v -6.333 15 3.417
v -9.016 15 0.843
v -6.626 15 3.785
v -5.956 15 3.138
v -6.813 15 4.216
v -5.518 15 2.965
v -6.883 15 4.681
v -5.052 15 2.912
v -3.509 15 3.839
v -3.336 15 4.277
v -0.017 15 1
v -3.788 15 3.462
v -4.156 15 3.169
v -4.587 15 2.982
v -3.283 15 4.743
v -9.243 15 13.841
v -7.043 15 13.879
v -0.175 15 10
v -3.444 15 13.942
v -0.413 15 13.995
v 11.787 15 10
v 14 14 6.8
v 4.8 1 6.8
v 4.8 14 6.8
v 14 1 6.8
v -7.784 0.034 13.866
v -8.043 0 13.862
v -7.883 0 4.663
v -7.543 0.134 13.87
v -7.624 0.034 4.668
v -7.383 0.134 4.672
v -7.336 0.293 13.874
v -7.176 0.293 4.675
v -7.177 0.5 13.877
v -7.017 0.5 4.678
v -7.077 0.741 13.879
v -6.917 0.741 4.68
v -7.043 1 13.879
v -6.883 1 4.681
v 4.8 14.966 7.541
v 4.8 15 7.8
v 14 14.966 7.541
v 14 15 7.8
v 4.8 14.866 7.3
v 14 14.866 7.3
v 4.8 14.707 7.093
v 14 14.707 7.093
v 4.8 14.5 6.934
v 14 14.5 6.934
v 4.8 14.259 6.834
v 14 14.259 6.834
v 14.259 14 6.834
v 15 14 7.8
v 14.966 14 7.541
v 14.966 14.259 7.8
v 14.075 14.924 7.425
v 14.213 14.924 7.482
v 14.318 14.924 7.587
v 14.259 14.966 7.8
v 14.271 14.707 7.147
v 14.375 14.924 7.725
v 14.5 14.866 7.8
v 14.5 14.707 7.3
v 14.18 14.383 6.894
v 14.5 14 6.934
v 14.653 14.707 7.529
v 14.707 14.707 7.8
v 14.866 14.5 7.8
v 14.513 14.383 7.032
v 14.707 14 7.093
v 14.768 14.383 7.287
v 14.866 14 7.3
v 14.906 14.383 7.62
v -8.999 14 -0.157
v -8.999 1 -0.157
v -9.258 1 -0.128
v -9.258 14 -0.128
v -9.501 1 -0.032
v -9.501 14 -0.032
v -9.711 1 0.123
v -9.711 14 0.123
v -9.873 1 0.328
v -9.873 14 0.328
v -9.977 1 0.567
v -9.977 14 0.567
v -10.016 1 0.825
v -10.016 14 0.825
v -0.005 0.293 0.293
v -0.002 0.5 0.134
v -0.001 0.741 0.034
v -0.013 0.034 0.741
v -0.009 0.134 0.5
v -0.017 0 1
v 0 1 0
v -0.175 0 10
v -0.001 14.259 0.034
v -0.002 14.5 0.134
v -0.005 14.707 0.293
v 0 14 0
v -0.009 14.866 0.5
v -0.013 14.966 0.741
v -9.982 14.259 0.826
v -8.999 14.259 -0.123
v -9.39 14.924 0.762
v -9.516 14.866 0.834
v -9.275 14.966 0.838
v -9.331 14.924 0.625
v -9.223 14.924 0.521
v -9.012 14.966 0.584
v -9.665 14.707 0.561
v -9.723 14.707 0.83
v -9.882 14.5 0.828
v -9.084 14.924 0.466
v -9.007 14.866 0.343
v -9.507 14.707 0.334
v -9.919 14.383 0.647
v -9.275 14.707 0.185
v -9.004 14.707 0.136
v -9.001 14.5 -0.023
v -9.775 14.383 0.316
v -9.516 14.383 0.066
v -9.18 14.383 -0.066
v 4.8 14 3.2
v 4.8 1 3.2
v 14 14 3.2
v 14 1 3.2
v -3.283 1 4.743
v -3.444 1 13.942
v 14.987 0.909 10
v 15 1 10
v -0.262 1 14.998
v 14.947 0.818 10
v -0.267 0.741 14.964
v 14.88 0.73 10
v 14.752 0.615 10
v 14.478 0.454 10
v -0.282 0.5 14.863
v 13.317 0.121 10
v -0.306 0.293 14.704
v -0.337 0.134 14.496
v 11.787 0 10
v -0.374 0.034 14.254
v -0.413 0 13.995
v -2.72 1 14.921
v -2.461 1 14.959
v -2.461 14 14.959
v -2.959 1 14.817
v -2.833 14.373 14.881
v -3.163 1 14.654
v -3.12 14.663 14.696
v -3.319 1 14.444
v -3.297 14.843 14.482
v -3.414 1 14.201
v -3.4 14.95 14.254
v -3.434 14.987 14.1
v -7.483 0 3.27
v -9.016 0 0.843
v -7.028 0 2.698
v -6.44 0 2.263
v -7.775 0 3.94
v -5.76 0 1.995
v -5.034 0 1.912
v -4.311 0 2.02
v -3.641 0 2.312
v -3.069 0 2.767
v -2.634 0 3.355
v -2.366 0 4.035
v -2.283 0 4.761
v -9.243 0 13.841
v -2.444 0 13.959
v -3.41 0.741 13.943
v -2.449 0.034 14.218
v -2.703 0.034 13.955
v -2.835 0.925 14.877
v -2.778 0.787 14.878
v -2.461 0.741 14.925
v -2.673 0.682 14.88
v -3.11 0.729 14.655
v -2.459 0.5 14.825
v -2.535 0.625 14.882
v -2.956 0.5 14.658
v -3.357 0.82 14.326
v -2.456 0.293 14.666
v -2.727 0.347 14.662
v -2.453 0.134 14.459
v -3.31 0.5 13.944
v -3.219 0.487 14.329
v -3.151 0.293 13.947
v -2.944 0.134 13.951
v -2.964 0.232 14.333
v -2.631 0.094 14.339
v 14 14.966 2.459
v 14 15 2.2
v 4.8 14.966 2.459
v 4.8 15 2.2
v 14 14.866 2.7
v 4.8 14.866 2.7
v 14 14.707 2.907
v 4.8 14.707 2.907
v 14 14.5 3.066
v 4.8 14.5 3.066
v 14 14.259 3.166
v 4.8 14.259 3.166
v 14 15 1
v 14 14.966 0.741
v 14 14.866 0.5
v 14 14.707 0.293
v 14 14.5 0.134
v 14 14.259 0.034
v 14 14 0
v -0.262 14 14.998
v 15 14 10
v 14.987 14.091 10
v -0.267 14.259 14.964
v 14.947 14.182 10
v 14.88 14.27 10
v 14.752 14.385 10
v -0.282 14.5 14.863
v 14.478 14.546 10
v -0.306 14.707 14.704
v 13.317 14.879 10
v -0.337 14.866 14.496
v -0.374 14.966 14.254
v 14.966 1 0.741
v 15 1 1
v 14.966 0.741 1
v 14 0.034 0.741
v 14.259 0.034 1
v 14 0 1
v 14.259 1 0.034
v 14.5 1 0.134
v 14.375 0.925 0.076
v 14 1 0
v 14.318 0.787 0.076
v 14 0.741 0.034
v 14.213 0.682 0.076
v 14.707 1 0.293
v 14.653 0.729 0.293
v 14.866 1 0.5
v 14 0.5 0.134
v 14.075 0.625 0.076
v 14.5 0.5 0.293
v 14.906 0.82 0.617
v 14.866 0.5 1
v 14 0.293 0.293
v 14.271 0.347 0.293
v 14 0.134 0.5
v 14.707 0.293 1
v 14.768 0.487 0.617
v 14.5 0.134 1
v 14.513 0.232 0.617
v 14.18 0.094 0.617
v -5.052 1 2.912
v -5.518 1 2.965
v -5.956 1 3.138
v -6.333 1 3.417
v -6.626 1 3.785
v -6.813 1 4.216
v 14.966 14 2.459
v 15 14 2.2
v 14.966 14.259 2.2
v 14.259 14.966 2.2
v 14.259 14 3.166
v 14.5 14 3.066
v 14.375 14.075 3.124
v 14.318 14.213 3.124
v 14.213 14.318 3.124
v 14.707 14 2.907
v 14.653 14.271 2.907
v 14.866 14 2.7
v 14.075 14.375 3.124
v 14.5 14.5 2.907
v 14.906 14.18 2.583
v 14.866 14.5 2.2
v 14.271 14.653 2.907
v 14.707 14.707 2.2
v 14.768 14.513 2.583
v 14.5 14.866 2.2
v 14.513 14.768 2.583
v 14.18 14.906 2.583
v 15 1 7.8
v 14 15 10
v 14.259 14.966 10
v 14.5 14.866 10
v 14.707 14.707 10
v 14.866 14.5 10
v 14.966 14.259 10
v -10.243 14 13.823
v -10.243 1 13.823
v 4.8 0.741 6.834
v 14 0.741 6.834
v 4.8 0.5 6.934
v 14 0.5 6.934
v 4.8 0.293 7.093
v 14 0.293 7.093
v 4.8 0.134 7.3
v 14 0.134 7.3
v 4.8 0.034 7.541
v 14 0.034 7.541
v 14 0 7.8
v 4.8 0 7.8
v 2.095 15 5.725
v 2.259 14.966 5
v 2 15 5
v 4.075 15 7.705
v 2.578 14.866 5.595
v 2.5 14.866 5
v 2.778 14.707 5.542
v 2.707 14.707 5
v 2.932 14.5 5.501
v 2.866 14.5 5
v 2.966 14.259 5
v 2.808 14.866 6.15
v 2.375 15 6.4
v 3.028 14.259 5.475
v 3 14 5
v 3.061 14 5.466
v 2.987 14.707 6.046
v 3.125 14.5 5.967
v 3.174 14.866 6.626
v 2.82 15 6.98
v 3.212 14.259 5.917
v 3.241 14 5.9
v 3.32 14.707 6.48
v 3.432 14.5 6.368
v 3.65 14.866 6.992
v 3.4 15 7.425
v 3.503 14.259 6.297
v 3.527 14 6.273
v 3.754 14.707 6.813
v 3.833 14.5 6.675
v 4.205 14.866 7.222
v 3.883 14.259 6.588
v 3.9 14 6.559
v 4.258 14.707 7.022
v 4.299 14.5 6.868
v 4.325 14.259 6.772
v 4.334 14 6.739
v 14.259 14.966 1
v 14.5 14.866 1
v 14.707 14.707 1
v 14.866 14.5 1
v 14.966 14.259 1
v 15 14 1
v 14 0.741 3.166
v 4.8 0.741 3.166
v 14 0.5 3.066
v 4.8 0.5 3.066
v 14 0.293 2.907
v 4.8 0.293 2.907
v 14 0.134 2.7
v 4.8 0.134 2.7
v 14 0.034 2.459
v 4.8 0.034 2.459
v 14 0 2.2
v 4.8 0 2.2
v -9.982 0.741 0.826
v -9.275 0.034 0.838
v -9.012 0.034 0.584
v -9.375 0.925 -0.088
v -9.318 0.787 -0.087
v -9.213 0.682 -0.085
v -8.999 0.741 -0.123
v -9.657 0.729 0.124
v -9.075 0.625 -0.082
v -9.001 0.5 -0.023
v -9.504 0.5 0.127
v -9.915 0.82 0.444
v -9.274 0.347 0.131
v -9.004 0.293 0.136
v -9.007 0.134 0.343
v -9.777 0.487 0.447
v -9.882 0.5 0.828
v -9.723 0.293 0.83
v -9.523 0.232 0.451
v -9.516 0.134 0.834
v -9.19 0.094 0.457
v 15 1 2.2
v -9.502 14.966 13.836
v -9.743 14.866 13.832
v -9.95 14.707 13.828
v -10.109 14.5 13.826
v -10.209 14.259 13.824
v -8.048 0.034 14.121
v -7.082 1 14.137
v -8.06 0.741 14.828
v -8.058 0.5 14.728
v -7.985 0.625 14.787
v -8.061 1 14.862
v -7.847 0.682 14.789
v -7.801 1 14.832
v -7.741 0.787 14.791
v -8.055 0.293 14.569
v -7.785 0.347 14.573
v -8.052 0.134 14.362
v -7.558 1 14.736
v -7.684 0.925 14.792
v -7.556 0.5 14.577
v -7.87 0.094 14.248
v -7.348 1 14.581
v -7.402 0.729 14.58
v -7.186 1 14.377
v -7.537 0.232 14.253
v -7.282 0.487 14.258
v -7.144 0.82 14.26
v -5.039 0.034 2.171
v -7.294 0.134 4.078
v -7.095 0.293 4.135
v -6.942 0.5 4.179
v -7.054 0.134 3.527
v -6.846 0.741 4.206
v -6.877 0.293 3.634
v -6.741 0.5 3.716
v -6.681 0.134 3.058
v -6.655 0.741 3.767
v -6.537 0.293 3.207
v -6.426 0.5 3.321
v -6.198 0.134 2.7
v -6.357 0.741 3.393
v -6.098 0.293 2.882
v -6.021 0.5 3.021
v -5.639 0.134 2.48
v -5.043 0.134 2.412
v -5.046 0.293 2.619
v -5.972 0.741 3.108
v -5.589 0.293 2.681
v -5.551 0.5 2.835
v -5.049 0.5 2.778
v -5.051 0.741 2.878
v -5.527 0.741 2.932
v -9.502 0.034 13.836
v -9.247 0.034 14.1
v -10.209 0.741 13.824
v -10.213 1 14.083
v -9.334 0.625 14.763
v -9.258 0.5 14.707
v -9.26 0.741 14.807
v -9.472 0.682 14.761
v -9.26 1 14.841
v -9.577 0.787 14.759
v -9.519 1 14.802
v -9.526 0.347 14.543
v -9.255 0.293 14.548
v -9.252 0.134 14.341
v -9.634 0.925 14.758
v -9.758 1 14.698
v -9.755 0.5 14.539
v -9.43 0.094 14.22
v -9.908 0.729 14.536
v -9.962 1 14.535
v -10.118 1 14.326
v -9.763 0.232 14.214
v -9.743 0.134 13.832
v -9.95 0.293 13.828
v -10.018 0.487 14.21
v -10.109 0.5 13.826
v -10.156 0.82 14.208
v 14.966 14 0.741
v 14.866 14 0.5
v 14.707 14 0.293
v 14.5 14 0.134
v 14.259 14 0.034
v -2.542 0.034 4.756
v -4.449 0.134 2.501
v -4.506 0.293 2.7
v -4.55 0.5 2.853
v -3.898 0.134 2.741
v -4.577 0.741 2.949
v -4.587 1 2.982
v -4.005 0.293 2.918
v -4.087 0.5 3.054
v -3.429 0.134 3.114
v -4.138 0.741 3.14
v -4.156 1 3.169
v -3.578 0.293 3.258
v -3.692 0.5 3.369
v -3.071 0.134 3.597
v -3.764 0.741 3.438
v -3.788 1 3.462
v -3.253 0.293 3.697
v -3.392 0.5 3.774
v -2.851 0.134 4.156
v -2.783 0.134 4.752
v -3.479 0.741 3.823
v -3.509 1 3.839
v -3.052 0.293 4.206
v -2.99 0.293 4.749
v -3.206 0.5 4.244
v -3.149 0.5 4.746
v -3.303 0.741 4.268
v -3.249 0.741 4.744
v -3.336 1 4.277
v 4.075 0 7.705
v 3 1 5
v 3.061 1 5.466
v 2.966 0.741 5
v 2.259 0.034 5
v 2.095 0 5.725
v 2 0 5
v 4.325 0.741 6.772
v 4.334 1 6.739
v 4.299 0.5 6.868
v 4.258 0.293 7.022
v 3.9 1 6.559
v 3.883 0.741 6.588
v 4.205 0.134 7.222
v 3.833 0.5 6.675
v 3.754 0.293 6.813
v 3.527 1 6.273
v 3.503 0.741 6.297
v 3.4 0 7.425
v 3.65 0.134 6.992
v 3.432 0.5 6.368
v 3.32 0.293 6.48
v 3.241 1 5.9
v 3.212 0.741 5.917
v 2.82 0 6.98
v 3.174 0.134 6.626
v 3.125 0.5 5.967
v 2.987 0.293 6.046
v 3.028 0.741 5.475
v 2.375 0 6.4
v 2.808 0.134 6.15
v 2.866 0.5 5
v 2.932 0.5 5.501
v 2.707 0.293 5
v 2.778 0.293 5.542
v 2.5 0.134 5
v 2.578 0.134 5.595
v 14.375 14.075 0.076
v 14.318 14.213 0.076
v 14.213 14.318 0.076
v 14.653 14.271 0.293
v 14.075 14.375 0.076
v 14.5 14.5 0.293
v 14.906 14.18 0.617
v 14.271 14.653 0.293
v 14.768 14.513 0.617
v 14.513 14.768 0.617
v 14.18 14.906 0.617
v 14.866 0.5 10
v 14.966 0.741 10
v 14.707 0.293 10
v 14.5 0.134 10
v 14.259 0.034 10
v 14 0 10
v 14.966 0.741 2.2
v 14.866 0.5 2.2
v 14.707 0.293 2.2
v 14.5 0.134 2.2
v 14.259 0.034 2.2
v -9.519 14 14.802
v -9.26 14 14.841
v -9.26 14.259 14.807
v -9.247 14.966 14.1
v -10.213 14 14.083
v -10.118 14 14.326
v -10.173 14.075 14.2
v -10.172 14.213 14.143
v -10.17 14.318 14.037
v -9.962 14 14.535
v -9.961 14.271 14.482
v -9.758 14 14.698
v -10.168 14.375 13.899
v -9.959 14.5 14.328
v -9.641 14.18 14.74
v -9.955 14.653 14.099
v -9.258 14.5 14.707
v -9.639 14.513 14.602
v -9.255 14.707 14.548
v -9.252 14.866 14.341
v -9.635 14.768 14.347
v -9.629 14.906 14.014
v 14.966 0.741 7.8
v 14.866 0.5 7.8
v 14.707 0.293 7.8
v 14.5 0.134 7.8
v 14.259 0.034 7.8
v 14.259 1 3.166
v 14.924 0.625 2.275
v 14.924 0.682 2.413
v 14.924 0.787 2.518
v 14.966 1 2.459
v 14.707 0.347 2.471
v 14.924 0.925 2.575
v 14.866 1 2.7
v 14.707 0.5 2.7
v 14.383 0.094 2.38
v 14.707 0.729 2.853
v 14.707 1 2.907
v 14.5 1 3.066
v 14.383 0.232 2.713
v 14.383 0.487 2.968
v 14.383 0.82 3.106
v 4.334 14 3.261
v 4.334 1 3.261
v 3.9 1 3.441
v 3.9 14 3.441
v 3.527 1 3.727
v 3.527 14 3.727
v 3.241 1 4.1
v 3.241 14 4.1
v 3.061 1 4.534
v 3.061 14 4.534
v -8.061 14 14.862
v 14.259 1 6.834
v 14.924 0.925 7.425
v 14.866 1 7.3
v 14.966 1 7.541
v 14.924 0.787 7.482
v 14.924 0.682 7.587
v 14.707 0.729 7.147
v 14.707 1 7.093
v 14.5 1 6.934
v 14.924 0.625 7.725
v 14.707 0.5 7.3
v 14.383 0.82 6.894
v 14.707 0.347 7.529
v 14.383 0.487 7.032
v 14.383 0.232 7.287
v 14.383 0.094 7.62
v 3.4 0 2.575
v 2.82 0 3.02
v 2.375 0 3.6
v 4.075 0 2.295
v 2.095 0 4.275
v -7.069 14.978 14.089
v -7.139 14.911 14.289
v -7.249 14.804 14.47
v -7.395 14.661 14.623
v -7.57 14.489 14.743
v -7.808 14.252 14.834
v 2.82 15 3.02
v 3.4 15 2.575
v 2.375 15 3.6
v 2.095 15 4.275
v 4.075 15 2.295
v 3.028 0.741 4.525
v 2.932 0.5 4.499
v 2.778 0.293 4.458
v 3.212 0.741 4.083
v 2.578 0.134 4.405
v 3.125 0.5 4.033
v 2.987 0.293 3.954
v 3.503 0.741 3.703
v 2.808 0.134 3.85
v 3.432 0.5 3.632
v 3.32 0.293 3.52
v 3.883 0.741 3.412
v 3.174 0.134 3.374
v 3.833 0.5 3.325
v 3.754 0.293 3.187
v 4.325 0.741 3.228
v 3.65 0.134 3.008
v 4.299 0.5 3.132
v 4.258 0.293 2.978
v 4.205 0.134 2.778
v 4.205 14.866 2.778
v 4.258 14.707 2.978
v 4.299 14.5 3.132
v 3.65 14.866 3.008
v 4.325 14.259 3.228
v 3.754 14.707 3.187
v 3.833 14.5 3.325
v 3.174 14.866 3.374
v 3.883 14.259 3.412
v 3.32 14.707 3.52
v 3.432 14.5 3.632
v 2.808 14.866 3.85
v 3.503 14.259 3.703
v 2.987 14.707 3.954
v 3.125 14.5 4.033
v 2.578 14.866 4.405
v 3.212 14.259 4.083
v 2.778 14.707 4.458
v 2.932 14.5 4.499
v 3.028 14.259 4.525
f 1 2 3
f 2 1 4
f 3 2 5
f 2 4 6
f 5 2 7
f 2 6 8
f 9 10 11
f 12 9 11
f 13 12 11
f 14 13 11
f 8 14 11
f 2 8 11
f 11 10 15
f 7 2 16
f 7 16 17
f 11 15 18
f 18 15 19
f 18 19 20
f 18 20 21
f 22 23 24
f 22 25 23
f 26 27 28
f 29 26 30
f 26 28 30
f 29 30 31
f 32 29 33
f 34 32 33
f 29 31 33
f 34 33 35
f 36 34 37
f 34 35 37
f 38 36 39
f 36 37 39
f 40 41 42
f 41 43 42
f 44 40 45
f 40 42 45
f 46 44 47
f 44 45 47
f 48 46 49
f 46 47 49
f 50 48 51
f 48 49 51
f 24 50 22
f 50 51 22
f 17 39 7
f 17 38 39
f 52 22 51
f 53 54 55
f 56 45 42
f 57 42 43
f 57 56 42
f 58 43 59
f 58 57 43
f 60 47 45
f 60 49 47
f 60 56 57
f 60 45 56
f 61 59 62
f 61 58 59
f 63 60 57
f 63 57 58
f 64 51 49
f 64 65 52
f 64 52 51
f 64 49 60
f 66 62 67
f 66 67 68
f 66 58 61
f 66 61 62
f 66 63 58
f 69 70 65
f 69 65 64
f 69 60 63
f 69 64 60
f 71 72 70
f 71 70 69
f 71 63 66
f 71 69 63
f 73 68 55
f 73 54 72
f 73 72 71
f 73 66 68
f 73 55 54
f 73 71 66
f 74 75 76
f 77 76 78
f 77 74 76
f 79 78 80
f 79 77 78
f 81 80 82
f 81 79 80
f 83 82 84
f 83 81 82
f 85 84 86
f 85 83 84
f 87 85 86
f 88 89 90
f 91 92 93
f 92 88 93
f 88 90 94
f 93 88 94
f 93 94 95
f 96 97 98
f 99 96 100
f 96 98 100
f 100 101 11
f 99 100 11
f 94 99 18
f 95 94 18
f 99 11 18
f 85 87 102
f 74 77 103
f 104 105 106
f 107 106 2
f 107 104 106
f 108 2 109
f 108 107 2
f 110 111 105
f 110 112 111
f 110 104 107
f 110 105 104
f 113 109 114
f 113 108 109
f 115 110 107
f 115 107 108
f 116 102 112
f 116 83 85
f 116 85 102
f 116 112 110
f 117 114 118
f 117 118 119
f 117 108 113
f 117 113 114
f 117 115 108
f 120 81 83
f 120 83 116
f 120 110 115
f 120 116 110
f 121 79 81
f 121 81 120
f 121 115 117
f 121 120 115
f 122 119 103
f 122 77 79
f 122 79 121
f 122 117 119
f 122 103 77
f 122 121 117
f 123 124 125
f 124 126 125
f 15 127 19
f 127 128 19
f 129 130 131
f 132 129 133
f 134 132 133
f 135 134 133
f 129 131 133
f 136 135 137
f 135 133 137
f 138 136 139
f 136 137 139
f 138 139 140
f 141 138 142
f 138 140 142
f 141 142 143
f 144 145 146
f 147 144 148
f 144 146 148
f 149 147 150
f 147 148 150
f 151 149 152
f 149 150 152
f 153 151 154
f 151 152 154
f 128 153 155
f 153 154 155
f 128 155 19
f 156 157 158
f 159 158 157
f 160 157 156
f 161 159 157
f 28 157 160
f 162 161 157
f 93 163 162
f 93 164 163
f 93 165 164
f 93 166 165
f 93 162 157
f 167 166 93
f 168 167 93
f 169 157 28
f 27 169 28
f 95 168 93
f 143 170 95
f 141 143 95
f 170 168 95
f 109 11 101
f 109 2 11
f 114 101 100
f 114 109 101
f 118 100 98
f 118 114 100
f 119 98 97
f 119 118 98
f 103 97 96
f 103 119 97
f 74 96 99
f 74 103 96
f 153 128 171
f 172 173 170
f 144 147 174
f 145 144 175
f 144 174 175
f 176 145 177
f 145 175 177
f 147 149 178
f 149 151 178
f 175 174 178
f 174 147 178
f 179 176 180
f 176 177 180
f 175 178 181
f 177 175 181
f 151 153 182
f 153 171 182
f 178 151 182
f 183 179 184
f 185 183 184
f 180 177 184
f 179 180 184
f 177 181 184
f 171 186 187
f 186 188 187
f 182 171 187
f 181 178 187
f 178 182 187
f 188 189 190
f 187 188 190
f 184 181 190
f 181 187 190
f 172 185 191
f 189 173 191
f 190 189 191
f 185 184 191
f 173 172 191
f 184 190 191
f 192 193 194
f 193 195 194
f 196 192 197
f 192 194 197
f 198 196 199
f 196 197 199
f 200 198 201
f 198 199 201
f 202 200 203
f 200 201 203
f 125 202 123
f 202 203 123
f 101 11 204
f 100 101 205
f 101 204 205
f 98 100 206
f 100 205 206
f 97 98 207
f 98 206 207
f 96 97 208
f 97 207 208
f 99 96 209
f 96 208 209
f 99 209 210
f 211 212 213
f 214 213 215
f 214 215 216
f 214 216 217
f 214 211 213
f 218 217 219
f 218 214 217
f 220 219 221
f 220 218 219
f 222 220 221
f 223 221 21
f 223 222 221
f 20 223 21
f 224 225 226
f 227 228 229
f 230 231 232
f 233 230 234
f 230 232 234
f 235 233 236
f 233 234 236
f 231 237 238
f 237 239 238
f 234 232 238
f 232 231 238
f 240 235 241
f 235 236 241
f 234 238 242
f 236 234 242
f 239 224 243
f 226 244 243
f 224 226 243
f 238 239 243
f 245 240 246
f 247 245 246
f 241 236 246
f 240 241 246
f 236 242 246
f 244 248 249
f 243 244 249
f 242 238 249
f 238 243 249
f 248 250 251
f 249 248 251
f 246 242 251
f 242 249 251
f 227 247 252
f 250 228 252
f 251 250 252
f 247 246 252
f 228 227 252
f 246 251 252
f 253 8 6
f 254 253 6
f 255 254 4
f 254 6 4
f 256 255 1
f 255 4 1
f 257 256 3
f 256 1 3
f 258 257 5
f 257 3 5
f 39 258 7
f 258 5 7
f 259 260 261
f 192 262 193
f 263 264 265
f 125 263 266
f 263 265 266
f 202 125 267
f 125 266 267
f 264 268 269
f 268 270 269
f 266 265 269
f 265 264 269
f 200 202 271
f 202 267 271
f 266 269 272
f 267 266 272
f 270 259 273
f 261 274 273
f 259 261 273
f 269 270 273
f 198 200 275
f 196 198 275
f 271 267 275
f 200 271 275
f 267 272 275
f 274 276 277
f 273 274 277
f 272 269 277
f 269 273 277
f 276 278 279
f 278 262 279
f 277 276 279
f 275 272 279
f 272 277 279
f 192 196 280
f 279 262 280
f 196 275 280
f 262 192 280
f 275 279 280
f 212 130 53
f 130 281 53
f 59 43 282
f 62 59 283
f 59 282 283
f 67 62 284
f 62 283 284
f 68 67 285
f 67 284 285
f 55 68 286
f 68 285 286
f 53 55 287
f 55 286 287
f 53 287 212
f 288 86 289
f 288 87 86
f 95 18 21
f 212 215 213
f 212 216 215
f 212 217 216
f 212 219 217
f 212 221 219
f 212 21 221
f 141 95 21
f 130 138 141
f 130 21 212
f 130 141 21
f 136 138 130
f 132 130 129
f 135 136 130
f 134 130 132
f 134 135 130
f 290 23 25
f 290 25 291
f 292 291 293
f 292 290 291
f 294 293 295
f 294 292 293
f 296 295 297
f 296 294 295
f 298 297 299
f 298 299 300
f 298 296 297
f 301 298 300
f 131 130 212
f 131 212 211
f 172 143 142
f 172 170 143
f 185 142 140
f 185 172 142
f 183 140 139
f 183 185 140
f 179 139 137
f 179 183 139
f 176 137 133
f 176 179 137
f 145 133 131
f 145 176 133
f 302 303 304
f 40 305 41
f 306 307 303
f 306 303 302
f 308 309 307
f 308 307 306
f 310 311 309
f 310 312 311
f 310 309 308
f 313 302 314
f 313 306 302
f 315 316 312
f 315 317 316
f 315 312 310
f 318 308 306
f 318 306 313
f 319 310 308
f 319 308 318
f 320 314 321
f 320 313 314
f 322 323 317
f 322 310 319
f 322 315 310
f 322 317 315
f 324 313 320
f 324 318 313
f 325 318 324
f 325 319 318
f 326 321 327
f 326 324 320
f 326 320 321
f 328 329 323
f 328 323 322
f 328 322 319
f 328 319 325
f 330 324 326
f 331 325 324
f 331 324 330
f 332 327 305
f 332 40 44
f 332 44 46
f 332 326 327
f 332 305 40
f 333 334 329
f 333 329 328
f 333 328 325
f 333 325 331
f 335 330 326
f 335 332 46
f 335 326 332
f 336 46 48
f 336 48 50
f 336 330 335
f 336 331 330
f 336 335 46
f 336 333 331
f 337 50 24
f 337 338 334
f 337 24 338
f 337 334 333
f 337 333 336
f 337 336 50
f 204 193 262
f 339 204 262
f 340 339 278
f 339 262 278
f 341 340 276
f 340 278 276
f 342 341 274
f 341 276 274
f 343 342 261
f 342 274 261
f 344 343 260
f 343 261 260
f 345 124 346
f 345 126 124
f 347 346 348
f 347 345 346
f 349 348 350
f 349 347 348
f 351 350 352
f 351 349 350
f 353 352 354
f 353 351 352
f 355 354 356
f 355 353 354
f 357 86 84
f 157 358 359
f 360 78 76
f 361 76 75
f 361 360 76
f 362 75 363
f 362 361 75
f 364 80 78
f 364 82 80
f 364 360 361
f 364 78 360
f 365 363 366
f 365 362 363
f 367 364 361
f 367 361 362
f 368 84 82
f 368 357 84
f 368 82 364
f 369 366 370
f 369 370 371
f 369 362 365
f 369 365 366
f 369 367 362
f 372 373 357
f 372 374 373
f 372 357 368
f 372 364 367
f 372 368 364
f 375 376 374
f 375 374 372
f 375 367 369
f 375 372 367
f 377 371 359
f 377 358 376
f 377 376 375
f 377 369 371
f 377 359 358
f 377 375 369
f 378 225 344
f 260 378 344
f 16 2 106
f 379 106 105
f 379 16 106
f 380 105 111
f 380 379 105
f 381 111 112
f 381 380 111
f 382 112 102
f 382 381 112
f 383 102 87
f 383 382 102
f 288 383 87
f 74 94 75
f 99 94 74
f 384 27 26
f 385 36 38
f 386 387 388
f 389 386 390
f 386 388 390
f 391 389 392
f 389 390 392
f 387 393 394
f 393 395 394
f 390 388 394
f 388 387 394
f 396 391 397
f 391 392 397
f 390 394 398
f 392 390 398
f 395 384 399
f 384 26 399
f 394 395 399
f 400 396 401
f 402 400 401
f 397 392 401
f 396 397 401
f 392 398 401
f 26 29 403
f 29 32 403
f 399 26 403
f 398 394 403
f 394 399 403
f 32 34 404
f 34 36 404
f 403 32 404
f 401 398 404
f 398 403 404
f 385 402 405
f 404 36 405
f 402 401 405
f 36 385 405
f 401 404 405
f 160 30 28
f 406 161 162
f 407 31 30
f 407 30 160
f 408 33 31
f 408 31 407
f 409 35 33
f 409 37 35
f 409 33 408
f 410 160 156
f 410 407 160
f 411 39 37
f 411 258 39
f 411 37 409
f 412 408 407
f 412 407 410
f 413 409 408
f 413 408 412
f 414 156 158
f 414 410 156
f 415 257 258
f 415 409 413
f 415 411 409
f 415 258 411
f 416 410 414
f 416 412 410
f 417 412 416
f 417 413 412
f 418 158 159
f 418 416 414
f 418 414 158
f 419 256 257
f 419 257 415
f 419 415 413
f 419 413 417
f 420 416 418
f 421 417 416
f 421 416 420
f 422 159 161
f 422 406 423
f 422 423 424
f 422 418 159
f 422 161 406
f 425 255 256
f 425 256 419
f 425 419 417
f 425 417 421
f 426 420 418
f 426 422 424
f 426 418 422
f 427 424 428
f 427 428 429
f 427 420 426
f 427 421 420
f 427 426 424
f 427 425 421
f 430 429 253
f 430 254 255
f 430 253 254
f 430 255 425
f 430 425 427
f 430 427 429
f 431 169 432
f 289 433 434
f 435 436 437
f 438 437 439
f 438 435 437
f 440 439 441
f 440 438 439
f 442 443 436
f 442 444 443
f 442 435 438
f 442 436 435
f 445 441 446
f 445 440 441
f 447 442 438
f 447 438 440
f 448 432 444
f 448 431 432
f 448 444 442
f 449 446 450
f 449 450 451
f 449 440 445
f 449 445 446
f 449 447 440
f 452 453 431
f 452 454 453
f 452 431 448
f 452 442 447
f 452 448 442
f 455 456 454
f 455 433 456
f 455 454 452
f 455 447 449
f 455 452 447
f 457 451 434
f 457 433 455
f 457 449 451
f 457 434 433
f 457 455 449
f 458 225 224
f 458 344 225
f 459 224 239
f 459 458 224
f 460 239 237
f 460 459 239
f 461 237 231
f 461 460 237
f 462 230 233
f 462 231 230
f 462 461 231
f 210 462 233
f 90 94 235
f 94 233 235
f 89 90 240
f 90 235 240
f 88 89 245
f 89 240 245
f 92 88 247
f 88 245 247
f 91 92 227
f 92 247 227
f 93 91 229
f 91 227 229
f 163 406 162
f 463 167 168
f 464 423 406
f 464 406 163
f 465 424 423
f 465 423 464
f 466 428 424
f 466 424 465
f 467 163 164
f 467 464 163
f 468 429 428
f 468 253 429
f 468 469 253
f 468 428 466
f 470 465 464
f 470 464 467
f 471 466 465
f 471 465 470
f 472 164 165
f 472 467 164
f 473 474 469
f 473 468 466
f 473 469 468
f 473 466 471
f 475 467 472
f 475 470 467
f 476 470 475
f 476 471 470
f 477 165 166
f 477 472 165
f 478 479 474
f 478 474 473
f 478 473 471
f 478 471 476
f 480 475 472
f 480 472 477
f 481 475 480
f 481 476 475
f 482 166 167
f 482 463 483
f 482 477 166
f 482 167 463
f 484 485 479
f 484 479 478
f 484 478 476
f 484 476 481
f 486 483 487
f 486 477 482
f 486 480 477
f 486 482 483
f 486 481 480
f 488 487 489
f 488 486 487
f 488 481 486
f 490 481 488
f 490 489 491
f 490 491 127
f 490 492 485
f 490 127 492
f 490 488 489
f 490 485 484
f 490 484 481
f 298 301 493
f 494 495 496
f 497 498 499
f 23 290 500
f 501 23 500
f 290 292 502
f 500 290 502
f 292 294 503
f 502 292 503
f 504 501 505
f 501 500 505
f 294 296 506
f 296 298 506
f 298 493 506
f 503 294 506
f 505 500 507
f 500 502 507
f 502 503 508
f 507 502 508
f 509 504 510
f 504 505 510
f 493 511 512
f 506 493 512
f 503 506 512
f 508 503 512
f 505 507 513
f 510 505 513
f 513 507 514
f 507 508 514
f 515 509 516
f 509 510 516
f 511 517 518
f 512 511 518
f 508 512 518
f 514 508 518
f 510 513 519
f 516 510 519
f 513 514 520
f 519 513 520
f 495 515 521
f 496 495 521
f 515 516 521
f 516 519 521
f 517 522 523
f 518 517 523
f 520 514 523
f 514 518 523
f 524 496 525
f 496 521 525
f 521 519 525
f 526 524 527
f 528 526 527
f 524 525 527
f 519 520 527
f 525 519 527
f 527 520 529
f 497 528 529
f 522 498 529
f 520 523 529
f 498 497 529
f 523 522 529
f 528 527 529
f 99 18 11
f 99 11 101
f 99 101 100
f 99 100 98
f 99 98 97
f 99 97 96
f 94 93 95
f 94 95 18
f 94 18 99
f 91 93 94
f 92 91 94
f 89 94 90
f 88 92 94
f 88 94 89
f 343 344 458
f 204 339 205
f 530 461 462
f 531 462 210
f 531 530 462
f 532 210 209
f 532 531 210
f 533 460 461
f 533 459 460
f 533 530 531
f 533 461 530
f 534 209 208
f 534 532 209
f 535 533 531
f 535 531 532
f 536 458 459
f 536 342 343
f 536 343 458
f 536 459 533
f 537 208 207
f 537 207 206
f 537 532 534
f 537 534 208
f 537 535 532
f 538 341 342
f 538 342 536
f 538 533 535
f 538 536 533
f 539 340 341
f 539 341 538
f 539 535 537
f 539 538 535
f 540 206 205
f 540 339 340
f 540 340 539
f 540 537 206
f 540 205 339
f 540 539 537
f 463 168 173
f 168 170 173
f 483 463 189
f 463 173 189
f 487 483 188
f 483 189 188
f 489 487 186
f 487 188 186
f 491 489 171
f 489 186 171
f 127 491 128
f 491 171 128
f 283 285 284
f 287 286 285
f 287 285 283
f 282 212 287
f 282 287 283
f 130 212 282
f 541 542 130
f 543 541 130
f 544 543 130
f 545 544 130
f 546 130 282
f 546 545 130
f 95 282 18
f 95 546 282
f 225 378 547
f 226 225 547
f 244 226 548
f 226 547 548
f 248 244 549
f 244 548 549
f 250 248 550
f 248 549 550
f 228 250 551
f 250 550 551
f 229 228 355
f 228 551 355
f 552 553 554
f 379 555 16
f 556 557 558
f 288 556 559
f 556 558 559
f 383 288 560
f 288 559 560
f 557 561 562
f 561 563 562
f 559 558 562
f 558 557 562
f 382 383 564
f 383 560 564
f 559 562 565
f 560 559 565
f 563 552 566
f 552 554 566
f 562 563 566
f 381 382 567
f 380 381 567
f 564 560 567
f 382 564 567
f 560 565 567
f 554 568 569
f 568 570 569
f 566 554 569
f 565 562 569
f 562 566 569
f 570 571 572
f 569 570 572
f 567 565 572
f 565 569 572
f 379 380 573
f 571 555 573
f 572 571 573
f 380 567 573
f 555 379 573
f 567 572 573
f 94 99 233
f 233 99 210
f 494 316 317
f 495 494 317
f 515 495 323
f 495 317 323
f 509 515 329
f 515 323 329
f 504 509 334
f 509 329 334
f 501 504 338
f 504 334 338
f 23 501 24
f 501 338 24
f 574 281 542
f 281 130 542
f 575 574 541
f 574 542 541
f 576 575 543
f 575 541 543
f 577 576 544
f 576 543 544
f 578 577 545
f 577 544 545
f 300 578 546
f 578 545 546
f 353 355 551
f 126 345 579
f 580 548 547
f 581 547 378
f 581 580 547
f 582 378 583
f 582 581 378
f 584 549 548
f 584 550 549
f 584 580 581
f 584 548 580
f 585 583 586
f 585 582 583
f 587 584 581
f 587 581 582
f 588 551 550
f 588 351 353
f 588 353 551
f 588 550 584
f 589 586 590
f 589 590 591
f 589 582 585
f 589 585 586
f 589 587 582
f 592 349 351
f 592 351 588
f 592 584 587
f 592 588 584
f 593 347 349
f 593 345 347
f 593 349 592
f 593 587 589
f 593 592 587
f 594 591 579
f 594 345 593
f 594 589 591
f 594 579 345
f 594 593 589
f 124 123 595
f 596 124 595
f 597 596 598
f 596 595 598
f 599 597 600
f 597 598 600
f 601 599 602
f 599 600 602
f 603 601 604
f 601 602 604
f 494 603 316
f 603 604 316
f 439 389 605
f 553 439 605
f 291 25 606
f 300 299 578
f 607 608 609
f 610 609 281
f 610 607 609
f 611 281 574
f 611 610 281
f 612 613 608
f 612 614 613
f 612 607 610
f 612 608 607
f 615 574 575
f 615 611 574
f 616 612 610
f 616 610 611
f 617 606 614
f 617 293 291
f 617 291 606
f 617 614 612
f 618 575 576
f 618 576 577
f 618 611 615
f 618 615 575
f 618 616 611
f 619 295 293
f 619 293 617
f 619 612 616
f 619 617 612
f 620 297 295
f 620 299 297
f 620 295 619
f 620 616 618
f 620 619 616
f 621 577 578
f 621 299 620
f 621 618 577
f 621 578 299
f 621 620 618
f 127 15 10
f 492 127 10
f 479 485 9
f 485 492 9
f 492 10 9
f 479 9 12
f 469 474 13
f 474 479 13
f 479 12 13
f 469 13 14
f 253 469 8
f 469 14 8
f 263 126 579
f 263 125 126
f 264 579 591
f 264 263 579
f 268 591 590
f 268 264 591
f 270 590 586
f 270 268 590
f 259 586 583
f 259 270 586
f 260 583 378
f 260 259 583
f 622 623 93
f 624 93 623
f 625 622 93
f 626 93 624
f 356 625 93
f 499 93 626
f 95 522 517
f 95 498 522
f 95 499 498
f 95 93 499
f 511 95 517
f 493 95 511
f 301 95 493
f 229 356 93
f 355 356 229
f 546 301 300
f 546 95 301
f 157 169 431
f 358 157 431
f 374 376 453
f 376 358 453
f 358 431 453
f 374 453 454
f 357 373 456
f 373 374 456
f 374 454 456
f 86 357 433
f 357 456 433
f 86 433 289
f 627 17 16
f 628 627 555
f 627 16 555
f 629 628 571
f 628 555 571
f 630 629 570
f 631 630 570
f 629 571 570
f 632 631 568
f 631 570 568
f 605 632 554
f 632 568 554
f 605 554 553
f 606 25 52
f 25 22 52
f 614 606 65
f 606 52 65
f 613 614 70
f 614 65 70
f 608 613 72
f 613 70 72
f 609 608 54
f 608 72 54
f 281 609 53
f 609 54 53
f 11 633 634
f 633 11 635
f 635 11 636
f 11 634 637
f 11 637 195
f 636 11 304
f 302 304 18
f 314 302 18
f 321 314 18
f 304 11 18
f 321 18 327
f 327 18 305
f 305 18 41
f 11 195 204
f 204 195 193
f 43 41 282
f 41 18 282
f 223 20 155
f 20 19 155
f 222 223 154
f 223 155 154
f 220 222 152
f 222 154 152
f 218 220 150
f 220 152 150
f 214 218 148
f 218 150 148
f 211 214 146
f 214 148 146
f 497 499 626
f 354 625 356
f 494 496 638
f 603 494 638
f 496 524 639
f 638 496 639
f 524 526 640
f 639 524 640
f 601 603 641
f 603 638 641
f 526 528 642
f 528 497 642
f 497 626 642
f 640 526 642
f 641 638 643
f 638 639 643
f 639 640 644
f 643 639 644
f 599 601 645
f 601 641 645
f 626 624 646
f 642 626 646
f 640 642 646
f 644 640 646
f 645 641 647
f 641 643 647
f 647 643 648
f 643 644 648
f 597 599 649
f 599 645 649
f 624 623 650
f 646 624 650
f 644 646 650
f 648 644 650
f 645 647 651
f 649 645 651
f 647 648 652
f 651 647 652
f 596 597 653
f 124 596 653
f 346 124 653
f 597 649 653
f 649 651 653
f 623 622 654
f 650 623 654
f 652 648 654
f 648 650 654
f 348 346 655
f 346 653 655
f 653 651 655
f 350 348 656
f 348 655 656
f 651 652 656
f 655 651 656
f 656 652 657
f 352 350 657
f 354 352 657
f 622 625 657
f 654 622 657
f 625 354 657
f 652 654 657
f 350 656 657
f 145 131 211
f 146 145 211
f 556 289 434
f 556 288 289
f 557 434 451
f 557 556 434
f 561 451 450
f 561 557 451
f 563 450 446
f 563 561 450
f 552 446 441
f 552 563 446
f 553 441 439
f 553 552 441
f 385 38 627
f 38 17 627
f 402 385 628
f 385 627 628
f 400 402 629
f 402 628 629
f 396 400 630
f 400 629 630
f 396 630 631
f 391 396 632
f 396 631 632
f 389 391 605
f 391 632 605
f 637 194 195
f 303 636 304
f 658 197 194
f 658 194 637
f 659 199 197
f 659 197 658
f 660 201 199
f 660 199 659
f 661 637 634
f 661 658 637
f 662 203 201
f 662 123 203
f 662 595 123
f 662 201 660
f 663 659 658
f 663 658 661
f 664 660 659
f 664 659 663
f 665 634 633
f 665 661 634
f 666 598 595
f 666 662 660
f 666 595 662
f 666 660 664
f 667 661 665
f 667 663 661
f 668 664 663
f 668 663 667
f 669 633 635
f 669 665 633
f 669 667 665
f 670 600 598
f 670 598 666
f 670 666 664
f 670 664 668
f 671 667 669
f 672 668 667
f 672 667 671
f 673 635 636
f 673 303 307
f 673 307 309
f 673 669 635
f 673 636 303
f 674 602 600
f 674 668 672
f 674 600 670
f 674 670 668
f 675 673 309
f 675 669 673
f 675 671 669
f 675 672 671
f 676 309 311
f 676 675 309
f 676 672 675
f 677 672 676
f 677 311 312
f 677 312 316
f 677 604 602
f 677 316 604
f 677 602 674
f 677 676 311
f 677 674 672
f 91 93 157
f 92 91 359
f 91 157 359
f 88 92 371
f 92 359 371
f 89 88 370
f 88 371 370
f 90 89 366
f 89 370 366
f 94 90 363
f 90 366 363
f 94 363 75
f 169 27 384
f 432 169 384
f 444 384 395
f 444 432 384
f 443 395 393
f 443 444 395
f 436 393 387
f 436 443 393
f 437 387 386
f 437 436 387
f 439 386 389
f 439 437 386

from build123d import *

# Parameters (mm, degrees)
F0_W     = 15
F0_H     = 15
F1_DEPTH = 10
F2_W     = 15
F2_H     = 3.6
F3_DEPTH = 12
F4_R     = 1.79999
F5_COUNT = 2
F5_ANGLE = 91
F7_DEPTH = 15
F9_DEPTH = 15
F10_R    = 1
F10_2_R  = 1


# Not quite as in the source:
# - a fillet or chamfer is up to 0.001 mm smaller than in the source, because OpenCascade refuses the exact size


with BuildPart() as f1:
    # F0 (on Top) → F1 (new body)
    with BuildSketch(Plane.XY):
        with Locations((7.5, 7.5)):
            Rectangle(F0_W, F0_H)
    extrude(amount=F1_DEPTH)

    # F2 (on face) → F3 (cut)
    with BuildSketch(Plane.YZ.offset(15)):
        with Locations((7.5, 5)):
            Rectangle(F2_W, F2_H)
    extrude(amount=-F3_DEPTH, mode=Mode.SUBTRACT)

    # F4 (radius 1.8 in the source; OpenCascade refuses exactly that, so slightly less here)
    f4_edges = [f1.edges().sort_by_distance(p)[0] for p in [
        (3, 7.5, 3.2),
        (3, 7.5, 6.8),
    ]]
    fillet(f4_edges, radius=F4_R)


with BuildPart() as f5_1:
    # F5: instance of F1
    add(f1.part.rotate(Axis((0, 7.5, 0), (0, -1, 0)), 1 * F5_ANGLE / (F5_COUNT - 1)))

    # F8 (on Front) → F9 (join, through all)
    with BuildSketch(Plane.XZ):
        Polygon((-0.2617860966, 14.9977154273), (-0.1745506493, 10), (15, 10), align=None)
    extrude(amount=-F9_DEPTH)

    # F10#2
    f10_2_edges = [f5_1.edges().sort_by_distance(p)[0] for p in [
        (-10.12937, 0, 7.324334),
        (-6.971743, 0, 9.779811),
        (-8.660507, 0, 14.851115),
        (-7.06075, 7.5, 14.879039),
        (-8.660507, 15, 14.851115),
        (-10.260263, 7.5, 14.823191),
        (-9.998477, 7.5, -0.174524),
        (-10.12937, 15, 7.324334),
        (-3.461299, 7.5, 14.941868),
        (-4.999238, 0, -0.087262),
        (-4.999238, 15, -0.087262),
        (-1.861542, 0, 14.969792),
        (7.369107, 0, 12.498858),
        (-1.861542, 15, 14.969792),
        (7.369107, 15, 12.498858),
        (-6.333398, 0, 3.417192),
        (-5.051596, 0, 2.912281),
        (-3.788195, 0, 3.461619),
        (-3.372291, 0, 9.842639),
    ]]
    fillet(f10_2_edges, radius=F10_2_R)


with BuildPart() as f1_1:
    add(f1.part)

    # F6 (on face) → F7 (join, through all)
    with BuildSketch(Plane.XZ):
        Polygon((0, 0), (0, 10), (-0.1745506493, 10), align=None)
    extrude(amount=-F7_DEPTH)

    # F10
    f10_edges = [f1_1.edges().sort_by_distance(p)[0] for p in [
        (9.899995, 0, 6.8),
        (15, 7.5, 6.8),
        (15, 15, 1.6),
        (15, 0, 1.6),
        (15, 7.5, 3.2),
        (9.899995, 15, 3.2),
        (15, 7.5, 0),
        (7.5, 0, 0),
        (7.5, 15, 0),
        (15, 0, 8.4),
        (15, 15, 8.4),
        (9.899995, 15, 6.8),
        (3.527205, 15, 3.727205),
        (3, 15, 5),
        (3.527205, 15, 6.272795),
        (3.527205, 0, 6.272795),
        (9.899995, 0, 3.2),
        (3, 0, 5),
        (3.527205, 0, 3.727205),
    ]]
    fillet(f10_edges, radius=F10_R)


solid = Compound([f5_1.part, f1_1.part])
